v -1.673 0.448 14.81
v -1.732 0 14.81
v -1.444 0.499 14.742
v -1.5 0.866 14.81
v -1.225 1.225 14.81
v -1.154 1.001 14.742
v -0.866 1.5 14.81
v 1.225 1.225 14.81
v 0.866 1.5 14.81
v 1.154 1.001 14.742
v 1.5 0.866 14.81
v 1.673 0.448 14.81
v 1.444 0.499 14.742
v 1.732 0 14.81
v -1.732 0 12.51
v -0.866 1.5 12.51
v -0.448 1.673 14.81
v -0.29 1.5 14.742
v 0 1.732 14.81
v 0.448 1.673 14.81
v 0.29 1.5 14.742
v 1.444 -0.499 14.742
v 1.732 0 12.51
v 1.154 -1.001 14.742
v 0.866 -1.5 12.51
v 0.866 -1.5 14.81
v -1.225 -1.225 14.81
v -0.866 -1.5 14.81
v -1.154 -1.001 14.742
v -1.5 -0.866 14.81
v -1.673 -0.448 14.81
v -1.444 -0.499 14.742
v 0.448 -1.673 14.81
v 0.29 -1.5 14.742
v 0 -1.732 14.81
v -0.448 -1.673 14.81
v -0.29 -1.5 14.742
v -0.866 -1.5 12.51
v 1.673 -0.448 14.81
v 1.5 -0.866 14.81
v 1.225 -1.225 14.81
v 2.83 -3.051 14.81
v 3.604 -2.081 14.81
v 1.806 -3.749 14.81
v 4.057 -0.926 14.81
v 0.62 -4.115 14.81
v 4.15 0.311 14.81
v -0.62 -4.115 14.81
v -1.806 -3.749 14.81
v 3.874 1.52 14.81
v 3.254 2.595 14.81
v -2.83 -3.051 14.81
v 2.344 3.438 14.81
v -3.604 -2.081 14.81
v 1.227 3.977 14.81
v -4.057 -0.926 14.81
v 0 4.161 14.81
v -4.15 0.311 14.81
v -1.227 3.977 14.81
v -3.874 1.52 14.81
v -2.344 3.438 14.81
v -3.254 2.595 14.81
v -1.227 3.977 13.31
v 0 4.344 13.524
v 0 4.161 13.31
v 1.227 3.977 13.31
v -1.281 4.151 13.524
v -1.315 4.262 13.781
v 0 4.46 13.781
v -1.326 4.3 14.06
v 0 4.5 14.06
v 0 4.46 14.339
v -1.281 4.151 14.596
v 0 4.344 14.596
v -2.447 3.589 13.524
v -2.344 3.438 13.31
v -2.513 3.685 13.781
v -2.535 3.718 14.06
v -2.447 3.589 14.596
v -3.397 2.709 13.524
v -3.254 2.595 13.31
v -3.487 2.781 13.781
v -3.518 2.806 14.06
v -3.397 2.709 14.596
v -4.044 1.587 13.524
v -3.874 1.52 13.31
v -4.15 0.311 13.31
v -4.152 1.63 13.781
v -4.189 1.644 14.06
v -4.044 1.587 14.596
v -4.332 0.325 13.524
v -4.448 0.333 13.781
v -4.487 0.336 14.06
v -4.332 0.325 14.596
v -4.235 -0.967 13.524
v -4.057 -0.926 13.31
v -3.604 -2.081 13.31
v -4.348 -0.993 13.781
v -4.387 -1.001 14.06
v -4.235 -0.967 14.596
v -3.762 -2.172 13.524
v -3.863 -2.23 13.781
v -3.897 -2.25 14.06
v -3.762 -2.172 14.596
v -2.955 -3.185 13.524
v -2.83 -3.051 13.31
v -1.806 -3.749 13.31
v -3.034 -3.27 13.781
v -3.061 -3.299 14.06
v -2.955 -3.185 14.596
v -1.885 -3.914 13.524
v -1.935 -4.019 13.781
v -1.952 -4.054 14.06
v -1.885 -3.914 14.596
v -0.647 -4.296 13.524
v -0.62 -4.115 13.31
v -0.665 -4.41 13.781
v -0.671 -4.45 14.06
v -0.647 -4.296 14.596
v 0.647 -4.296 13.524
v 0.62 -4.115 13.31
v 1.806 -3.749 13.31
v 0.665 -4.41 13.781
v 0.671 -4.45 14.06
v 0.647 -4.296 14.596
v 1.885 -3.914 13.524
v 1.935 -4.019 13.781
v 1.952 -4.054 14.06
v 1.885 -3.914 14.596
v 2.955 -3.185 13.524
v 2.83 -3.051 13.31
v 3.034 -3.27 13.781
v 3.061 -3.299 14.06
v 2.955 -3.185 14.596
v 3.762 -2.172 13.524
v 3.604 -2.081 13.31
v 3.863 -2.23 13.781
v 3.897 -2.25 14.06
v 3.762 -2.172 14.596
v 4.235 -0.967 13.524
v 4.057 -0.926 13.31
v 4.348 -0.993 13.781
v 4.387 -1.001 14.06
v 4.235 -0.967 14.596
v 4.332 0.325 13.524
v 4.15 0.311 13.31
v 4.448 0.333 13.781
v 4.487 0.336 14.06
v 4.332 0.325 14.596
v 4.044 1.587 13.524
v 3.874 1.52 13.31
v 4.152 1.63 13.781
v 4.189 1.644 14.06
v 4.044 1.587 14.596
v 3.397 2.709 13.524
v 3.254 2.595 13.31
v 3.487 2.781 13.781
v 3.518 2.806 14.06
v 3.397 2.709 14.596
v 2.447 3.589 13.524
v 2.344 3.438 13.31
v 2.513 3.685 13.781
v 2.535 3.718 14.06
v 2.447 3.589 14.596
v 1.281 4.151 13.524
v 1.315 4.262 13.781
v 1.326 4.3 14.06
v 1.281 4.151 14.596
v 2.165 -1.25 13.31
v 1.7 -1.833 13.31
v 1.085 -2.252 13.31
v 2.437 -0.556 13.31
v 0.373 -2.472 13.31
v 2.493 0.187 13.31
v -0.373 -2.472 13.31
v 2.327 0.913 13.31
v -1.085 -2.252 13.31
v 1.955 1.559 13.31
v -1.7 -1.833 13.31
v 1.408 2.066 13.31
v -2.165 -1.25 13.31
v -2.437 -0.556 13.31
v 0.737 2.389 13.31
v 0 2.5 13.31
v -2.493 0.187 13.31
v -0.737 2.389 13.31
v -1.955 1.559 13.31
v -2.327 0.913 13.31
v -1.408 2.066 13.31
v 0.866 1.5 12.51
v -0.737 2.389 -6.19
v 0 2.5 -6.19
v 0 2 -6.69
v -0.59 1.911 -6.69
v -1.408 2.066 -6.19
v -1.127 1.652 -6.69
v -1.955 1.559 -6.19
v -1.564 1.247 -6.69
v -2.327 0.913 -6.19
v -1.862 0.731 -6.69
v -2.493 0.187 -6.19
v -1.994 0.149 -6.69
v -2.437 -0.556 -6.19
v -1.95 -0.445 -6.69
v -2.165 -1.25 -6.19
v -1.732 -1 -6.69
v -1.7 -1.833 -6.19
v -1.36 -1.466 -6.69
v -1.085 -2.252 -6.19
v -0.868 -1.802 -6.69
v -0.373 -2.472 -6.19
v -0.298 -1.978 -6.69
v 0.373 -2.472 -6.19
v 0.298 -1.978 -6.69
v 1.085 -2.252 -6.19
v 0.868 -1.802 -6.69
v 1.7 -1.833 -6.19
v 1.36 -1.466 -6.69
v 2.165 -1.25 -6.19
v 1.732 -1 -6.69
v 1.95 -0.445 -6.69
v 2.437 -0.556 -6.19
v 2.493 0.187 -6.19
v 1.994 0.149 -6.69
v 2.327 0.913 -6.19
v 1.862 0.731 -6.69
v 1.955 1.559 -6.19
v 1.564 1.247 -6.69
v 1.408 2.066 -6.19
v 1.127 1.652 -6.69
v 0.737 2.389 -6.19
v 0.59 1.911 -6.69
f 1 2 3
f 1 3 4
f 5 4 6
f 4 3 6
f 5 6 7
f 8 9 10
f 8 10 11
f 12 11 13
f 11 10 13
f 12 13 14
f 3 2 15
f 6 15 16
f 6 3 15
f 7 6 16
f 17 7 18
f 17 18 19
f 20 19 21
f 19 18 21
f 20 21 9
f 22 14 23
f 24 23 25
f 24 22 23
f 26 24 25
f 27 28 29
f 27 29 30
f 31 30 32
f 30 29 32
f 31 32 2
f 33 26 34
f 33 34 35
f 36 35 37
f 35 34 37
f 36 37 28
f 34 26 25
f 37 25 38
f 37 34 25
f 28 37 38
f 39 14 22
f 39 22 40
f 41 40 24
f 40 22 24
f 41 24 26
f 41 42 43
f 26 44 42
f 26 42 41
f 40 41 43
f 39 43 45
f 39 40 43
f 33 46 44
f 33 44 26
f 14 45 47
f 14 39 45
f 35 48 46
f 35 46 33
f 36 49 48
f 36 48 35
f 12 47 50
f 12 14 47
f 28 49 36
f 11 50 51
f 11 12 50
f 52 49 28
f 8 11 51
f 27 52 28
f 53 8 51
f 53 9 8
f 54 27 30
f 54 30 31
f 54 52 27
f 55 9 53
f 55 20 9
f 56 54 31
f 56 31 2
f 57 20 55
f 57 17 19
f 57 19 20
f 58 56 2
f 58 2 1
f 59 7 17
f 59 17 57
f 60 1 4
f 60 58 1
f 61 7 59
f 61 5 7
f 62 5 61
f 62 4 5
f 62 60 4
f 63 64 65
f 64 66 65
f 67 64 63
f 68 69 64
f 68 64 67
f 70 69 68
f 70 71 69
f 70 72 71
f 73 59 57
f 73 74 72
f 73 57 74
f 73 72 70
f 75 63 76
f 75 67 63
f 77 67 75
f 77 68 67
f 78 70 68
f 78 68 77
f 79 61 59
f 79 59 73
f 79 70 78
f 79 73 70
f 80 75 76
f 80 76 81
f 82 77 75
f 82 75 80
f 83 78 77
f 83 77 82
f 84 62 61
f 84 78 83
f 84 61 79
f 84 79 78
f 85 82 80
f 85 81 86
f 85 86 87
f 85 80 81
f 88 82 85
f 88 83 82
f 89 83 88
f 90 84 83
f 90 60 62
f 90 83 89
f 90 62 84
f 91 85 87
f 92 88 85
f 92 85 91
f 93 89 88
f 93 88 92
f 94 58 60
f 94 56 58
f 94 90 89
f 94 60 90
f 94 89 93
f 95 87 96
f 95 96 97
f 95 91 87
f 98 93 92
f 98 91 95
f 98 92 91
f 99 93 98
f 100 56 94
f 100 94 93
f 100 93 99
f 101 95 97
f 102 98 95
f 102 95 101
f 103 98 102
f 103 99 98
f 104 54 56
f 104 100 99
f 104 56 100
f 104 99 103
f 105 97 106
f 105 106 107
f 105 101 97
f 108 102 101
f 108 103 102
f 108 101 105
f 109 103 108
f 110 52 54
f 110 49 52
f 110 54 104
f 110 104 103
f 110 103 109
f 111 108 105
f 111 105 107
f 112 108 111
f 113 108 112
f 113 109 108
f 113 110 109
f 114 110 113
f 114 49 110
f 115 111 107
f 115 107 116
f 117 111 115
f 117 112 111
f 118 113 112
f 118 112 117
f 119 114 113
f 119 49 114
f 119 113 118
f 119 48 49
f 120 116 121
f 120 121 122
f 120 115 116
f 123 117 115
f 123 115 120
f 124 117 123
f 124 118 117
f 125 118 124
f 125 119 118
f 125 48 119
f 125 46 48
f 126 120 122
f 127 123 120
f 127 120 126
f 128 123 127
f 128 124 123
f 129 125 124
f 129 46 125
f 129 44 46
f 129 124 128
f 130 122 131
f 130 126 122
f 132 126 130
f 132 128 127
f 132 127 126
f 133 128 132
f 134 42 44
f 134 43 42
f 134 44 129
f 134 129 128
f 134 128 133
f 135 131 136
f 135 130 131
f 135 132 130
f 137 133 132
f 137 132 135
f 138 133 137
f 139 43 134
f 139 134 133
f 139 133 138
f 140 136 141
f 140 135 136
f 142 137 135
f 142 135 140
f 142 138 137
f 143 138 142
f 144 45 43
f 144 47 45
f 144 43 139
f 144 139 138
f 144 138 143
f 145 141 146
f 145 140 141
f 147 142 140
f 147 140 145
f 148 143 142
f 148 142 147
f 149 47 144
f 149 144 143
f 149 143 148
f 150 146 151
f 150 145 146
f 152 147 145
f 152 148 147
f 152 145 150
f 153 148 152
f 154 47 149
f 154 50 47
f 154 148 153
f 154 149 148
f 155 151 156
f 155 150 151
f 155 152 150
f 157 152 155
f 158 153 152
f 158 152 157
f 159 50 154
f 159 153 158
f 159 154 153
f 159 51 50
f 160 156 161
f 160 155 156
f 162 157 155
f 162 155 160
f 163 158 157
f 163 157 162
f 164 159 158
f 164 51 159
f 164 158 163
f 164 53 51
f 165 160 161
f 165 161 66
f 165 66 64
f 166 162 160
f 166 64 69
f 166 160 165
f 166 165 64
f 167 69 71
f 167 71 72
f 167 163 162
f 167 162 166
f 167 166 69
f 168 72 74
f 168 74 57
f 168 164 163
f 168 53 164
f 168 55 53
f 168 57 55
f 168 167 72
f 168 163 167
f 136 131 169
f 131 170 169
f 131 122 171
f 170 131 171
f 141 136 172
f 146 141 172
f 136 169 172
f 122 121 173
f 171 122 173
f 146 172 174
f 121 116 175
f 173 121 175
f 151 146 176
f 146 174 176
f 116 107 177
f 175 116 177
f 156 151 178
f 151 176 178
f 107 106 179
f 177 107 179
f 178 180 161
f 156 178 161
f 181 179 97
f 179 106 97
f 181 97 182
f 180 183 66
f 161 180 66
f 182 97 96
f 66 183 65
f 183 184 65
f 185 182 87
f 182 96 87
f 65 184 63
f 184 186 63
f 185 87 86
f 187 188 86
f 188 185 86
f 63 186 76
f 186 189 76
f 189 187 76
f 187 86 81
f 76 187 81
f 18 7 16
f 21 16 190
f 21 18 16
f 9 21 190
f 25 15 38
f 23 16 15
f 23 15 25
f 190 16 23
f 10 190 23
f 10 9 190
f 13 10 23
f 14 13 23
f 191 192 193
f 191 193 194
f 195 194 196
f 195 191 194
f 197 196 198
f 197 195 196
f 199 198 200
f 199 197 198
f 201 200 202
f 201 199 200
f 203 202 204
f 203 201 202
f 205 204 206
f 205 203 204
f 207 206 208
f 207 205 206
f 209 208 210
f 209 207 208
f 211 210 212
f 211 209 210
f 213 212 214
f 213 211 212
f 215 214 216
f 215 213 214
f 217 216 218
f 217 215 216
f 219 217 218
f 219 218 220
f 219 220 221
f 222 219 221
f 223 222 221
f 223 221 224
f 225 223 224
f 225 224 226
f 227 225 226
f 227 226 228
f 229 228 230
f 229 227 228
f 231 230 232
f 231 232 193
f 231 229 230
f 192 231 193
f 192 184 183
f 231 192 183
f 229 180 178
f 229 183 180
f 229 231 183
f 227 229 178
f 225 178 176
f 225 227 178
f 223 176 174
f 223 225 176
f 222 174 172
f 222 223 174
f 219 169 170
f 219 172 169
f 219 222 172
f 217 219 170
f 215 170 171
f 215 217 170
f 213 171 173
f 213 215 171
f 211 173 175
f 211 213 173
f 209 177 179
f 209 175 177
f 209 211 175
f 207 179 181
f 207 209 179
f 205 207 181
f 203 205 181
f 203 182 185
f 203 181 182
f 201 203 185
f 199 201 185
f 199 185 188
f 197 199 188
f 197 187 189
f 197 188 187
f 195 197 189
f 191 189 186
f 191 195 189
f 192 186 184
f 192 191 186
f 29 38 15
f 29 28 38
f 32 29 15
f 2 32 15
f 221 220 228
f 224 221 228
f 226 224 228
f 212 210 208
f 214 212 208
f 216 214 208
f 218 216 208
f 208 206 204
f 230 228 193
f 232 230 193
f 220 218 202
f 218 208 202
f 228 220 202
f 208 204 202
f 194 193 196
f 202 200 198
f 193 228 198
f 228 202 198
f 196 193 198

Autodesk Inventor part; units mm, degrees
ref_plane "YZ Plane" through (0, 0, 0) normal (1, 0, 0) x (0, 1, 0)
ref_plane "XZ Plane" through (0, 0, 0) normal (0, 1, 0) x (-1, 0, 0)
ref_plane "XY Plane" through (0, 0, 0) normal (0, 0, 1) x (1, 0, 0)
sketch "Sketch1" plane through (0, 0, 0) normal (1, 0, 0) x (0, 1, 0)
  line L0 (2.5, 2.81) -> (2.5, 11.31)
  spline S0 degree 2 poles (-3.9658, 2.81) (-4.0258, 2.8689) (-4.0876, 2.9295) knots 0 0 0 0.017848 0.017848 0.017848 weights 1 1.00044 1.00066
  line L1 (-2.5, 11.31) -> (-2.5, 2.81)
  line L2 (1.7321, 14.76) -> (1.7821, 14.81)
  line L3 (-1.7821, 14.81) -> (4.1614, 14.81)
  arc A0 (4.1614, 13.31) -> (4.1614, 14.81) centre (3.5, 14.06) ccw
  line L4 (4.1614, 13.31) -> (2.5, 13.31)
  line L5 (2.5, 13.31) -> (2.5, -6.19)
  line L6 (-2.5, -6.19) -> (-2.5, 13.31)
  line L7 (-2.5, 13.31) -> (-4.1614, 13.31)
  arc A1 (-4.1614, 14.81) -> (-4.1614, 13.31) centre (-3.5, 14.06) ccw
  line L8 (-4.1614, 14.81) -> (-1.7821, 14.81)
  line L9 (-1.7821, 14.81) -> (-1.7321, 14.76)
  line L10 (0, -6.69) -> (0, 14.81)
  line L11 (-2, -6.69) -> (2, -6.69)
  line L12 (2.5, -6.19) -> (2, -6.69)
  line L13 (-2.5, -6.19) -> (-2, -6.69)
  point P0 (0, 0)
  point P1 (2.5, -6.69)
  point P2 (-2.5, -6.69)
  dimension "d10" = 0.5
  dimension "d11" = 0.5
  dimension "d12" = 0.5
  dimension "d13" = 0.5
revolve "Revolution1" add sketch "Sketch1" angle 360 about axis through (0, 0, -6.69) along (0, 0, 1) contours L5 L12 L11 L10 L3 A0 L4 L0
sketch "Sketch2" plane through (0, 0, 14.81) normal (0, 0, 1) x (1, 0, 0)
  line L0 (1.732, 0) -> (0.866, -1.5)
  line L1 (0.866, -1.5) -> (-0.866, -1.5)
  line L2 (-0.866, -1.5) -> (-1.732, 0)
  line L3 (-1.732, 0) -> (-0.866, 1.5)
  line L4 (-0.866, 1.5) -> (0.866, 1.5)
  line L5 (0.866, 1.5) -> (1.732, 0)
  point P0 (0, 0)
  point P1 (0, 0)
  dimension "d1" = 3.464
extrude "Extrusion1" cut sketch "Sketch2" against normal blind 2.3
sketch "Sketch3" plane through (0, 0, 0) normal (0, 1, 0) x (-1, 0, 0)
  line L0 (0.866, 14.81) -> (-0.866, 14.81) projected
  line L1 (0.866, 14.81) -> (0.866, 12.51) projected
  line L2 (0.866, 12.51) -> (-0.866, 12.51) projected
  line L3 (-0.866, 14.81) -> (-0.866, 12.51) projected
  line L4 (1.732, 14.81) -> (1.732, 12.51) projected
  circle A0 centre (0, 19.6597) radius 5.1497
  line L5 (0, 14.81) -> (0, 14.51)
  line L6 (0, 14.81) -> (0, 24.8094)
  point P0 (0, 0)
  dimension "d5" = 0.3
revolve "Revolution2" cut sketch "Sketch3" angle 360 about axis through (0, 0, 14.81) along (0, 0, 1) contours L5 A0 L3 L0 | L0 L3 A0 L6
thread "Thread1" size "M5x0.8" class "6g" standard "ANSI Metric M Profile" full length
equation "\"d11\" = d10"
equation "\"d12\" = d10"
equation "\"d13\" = d12"
properties part number "Low Profile Screw M5 [20mm]" material "Steel"
